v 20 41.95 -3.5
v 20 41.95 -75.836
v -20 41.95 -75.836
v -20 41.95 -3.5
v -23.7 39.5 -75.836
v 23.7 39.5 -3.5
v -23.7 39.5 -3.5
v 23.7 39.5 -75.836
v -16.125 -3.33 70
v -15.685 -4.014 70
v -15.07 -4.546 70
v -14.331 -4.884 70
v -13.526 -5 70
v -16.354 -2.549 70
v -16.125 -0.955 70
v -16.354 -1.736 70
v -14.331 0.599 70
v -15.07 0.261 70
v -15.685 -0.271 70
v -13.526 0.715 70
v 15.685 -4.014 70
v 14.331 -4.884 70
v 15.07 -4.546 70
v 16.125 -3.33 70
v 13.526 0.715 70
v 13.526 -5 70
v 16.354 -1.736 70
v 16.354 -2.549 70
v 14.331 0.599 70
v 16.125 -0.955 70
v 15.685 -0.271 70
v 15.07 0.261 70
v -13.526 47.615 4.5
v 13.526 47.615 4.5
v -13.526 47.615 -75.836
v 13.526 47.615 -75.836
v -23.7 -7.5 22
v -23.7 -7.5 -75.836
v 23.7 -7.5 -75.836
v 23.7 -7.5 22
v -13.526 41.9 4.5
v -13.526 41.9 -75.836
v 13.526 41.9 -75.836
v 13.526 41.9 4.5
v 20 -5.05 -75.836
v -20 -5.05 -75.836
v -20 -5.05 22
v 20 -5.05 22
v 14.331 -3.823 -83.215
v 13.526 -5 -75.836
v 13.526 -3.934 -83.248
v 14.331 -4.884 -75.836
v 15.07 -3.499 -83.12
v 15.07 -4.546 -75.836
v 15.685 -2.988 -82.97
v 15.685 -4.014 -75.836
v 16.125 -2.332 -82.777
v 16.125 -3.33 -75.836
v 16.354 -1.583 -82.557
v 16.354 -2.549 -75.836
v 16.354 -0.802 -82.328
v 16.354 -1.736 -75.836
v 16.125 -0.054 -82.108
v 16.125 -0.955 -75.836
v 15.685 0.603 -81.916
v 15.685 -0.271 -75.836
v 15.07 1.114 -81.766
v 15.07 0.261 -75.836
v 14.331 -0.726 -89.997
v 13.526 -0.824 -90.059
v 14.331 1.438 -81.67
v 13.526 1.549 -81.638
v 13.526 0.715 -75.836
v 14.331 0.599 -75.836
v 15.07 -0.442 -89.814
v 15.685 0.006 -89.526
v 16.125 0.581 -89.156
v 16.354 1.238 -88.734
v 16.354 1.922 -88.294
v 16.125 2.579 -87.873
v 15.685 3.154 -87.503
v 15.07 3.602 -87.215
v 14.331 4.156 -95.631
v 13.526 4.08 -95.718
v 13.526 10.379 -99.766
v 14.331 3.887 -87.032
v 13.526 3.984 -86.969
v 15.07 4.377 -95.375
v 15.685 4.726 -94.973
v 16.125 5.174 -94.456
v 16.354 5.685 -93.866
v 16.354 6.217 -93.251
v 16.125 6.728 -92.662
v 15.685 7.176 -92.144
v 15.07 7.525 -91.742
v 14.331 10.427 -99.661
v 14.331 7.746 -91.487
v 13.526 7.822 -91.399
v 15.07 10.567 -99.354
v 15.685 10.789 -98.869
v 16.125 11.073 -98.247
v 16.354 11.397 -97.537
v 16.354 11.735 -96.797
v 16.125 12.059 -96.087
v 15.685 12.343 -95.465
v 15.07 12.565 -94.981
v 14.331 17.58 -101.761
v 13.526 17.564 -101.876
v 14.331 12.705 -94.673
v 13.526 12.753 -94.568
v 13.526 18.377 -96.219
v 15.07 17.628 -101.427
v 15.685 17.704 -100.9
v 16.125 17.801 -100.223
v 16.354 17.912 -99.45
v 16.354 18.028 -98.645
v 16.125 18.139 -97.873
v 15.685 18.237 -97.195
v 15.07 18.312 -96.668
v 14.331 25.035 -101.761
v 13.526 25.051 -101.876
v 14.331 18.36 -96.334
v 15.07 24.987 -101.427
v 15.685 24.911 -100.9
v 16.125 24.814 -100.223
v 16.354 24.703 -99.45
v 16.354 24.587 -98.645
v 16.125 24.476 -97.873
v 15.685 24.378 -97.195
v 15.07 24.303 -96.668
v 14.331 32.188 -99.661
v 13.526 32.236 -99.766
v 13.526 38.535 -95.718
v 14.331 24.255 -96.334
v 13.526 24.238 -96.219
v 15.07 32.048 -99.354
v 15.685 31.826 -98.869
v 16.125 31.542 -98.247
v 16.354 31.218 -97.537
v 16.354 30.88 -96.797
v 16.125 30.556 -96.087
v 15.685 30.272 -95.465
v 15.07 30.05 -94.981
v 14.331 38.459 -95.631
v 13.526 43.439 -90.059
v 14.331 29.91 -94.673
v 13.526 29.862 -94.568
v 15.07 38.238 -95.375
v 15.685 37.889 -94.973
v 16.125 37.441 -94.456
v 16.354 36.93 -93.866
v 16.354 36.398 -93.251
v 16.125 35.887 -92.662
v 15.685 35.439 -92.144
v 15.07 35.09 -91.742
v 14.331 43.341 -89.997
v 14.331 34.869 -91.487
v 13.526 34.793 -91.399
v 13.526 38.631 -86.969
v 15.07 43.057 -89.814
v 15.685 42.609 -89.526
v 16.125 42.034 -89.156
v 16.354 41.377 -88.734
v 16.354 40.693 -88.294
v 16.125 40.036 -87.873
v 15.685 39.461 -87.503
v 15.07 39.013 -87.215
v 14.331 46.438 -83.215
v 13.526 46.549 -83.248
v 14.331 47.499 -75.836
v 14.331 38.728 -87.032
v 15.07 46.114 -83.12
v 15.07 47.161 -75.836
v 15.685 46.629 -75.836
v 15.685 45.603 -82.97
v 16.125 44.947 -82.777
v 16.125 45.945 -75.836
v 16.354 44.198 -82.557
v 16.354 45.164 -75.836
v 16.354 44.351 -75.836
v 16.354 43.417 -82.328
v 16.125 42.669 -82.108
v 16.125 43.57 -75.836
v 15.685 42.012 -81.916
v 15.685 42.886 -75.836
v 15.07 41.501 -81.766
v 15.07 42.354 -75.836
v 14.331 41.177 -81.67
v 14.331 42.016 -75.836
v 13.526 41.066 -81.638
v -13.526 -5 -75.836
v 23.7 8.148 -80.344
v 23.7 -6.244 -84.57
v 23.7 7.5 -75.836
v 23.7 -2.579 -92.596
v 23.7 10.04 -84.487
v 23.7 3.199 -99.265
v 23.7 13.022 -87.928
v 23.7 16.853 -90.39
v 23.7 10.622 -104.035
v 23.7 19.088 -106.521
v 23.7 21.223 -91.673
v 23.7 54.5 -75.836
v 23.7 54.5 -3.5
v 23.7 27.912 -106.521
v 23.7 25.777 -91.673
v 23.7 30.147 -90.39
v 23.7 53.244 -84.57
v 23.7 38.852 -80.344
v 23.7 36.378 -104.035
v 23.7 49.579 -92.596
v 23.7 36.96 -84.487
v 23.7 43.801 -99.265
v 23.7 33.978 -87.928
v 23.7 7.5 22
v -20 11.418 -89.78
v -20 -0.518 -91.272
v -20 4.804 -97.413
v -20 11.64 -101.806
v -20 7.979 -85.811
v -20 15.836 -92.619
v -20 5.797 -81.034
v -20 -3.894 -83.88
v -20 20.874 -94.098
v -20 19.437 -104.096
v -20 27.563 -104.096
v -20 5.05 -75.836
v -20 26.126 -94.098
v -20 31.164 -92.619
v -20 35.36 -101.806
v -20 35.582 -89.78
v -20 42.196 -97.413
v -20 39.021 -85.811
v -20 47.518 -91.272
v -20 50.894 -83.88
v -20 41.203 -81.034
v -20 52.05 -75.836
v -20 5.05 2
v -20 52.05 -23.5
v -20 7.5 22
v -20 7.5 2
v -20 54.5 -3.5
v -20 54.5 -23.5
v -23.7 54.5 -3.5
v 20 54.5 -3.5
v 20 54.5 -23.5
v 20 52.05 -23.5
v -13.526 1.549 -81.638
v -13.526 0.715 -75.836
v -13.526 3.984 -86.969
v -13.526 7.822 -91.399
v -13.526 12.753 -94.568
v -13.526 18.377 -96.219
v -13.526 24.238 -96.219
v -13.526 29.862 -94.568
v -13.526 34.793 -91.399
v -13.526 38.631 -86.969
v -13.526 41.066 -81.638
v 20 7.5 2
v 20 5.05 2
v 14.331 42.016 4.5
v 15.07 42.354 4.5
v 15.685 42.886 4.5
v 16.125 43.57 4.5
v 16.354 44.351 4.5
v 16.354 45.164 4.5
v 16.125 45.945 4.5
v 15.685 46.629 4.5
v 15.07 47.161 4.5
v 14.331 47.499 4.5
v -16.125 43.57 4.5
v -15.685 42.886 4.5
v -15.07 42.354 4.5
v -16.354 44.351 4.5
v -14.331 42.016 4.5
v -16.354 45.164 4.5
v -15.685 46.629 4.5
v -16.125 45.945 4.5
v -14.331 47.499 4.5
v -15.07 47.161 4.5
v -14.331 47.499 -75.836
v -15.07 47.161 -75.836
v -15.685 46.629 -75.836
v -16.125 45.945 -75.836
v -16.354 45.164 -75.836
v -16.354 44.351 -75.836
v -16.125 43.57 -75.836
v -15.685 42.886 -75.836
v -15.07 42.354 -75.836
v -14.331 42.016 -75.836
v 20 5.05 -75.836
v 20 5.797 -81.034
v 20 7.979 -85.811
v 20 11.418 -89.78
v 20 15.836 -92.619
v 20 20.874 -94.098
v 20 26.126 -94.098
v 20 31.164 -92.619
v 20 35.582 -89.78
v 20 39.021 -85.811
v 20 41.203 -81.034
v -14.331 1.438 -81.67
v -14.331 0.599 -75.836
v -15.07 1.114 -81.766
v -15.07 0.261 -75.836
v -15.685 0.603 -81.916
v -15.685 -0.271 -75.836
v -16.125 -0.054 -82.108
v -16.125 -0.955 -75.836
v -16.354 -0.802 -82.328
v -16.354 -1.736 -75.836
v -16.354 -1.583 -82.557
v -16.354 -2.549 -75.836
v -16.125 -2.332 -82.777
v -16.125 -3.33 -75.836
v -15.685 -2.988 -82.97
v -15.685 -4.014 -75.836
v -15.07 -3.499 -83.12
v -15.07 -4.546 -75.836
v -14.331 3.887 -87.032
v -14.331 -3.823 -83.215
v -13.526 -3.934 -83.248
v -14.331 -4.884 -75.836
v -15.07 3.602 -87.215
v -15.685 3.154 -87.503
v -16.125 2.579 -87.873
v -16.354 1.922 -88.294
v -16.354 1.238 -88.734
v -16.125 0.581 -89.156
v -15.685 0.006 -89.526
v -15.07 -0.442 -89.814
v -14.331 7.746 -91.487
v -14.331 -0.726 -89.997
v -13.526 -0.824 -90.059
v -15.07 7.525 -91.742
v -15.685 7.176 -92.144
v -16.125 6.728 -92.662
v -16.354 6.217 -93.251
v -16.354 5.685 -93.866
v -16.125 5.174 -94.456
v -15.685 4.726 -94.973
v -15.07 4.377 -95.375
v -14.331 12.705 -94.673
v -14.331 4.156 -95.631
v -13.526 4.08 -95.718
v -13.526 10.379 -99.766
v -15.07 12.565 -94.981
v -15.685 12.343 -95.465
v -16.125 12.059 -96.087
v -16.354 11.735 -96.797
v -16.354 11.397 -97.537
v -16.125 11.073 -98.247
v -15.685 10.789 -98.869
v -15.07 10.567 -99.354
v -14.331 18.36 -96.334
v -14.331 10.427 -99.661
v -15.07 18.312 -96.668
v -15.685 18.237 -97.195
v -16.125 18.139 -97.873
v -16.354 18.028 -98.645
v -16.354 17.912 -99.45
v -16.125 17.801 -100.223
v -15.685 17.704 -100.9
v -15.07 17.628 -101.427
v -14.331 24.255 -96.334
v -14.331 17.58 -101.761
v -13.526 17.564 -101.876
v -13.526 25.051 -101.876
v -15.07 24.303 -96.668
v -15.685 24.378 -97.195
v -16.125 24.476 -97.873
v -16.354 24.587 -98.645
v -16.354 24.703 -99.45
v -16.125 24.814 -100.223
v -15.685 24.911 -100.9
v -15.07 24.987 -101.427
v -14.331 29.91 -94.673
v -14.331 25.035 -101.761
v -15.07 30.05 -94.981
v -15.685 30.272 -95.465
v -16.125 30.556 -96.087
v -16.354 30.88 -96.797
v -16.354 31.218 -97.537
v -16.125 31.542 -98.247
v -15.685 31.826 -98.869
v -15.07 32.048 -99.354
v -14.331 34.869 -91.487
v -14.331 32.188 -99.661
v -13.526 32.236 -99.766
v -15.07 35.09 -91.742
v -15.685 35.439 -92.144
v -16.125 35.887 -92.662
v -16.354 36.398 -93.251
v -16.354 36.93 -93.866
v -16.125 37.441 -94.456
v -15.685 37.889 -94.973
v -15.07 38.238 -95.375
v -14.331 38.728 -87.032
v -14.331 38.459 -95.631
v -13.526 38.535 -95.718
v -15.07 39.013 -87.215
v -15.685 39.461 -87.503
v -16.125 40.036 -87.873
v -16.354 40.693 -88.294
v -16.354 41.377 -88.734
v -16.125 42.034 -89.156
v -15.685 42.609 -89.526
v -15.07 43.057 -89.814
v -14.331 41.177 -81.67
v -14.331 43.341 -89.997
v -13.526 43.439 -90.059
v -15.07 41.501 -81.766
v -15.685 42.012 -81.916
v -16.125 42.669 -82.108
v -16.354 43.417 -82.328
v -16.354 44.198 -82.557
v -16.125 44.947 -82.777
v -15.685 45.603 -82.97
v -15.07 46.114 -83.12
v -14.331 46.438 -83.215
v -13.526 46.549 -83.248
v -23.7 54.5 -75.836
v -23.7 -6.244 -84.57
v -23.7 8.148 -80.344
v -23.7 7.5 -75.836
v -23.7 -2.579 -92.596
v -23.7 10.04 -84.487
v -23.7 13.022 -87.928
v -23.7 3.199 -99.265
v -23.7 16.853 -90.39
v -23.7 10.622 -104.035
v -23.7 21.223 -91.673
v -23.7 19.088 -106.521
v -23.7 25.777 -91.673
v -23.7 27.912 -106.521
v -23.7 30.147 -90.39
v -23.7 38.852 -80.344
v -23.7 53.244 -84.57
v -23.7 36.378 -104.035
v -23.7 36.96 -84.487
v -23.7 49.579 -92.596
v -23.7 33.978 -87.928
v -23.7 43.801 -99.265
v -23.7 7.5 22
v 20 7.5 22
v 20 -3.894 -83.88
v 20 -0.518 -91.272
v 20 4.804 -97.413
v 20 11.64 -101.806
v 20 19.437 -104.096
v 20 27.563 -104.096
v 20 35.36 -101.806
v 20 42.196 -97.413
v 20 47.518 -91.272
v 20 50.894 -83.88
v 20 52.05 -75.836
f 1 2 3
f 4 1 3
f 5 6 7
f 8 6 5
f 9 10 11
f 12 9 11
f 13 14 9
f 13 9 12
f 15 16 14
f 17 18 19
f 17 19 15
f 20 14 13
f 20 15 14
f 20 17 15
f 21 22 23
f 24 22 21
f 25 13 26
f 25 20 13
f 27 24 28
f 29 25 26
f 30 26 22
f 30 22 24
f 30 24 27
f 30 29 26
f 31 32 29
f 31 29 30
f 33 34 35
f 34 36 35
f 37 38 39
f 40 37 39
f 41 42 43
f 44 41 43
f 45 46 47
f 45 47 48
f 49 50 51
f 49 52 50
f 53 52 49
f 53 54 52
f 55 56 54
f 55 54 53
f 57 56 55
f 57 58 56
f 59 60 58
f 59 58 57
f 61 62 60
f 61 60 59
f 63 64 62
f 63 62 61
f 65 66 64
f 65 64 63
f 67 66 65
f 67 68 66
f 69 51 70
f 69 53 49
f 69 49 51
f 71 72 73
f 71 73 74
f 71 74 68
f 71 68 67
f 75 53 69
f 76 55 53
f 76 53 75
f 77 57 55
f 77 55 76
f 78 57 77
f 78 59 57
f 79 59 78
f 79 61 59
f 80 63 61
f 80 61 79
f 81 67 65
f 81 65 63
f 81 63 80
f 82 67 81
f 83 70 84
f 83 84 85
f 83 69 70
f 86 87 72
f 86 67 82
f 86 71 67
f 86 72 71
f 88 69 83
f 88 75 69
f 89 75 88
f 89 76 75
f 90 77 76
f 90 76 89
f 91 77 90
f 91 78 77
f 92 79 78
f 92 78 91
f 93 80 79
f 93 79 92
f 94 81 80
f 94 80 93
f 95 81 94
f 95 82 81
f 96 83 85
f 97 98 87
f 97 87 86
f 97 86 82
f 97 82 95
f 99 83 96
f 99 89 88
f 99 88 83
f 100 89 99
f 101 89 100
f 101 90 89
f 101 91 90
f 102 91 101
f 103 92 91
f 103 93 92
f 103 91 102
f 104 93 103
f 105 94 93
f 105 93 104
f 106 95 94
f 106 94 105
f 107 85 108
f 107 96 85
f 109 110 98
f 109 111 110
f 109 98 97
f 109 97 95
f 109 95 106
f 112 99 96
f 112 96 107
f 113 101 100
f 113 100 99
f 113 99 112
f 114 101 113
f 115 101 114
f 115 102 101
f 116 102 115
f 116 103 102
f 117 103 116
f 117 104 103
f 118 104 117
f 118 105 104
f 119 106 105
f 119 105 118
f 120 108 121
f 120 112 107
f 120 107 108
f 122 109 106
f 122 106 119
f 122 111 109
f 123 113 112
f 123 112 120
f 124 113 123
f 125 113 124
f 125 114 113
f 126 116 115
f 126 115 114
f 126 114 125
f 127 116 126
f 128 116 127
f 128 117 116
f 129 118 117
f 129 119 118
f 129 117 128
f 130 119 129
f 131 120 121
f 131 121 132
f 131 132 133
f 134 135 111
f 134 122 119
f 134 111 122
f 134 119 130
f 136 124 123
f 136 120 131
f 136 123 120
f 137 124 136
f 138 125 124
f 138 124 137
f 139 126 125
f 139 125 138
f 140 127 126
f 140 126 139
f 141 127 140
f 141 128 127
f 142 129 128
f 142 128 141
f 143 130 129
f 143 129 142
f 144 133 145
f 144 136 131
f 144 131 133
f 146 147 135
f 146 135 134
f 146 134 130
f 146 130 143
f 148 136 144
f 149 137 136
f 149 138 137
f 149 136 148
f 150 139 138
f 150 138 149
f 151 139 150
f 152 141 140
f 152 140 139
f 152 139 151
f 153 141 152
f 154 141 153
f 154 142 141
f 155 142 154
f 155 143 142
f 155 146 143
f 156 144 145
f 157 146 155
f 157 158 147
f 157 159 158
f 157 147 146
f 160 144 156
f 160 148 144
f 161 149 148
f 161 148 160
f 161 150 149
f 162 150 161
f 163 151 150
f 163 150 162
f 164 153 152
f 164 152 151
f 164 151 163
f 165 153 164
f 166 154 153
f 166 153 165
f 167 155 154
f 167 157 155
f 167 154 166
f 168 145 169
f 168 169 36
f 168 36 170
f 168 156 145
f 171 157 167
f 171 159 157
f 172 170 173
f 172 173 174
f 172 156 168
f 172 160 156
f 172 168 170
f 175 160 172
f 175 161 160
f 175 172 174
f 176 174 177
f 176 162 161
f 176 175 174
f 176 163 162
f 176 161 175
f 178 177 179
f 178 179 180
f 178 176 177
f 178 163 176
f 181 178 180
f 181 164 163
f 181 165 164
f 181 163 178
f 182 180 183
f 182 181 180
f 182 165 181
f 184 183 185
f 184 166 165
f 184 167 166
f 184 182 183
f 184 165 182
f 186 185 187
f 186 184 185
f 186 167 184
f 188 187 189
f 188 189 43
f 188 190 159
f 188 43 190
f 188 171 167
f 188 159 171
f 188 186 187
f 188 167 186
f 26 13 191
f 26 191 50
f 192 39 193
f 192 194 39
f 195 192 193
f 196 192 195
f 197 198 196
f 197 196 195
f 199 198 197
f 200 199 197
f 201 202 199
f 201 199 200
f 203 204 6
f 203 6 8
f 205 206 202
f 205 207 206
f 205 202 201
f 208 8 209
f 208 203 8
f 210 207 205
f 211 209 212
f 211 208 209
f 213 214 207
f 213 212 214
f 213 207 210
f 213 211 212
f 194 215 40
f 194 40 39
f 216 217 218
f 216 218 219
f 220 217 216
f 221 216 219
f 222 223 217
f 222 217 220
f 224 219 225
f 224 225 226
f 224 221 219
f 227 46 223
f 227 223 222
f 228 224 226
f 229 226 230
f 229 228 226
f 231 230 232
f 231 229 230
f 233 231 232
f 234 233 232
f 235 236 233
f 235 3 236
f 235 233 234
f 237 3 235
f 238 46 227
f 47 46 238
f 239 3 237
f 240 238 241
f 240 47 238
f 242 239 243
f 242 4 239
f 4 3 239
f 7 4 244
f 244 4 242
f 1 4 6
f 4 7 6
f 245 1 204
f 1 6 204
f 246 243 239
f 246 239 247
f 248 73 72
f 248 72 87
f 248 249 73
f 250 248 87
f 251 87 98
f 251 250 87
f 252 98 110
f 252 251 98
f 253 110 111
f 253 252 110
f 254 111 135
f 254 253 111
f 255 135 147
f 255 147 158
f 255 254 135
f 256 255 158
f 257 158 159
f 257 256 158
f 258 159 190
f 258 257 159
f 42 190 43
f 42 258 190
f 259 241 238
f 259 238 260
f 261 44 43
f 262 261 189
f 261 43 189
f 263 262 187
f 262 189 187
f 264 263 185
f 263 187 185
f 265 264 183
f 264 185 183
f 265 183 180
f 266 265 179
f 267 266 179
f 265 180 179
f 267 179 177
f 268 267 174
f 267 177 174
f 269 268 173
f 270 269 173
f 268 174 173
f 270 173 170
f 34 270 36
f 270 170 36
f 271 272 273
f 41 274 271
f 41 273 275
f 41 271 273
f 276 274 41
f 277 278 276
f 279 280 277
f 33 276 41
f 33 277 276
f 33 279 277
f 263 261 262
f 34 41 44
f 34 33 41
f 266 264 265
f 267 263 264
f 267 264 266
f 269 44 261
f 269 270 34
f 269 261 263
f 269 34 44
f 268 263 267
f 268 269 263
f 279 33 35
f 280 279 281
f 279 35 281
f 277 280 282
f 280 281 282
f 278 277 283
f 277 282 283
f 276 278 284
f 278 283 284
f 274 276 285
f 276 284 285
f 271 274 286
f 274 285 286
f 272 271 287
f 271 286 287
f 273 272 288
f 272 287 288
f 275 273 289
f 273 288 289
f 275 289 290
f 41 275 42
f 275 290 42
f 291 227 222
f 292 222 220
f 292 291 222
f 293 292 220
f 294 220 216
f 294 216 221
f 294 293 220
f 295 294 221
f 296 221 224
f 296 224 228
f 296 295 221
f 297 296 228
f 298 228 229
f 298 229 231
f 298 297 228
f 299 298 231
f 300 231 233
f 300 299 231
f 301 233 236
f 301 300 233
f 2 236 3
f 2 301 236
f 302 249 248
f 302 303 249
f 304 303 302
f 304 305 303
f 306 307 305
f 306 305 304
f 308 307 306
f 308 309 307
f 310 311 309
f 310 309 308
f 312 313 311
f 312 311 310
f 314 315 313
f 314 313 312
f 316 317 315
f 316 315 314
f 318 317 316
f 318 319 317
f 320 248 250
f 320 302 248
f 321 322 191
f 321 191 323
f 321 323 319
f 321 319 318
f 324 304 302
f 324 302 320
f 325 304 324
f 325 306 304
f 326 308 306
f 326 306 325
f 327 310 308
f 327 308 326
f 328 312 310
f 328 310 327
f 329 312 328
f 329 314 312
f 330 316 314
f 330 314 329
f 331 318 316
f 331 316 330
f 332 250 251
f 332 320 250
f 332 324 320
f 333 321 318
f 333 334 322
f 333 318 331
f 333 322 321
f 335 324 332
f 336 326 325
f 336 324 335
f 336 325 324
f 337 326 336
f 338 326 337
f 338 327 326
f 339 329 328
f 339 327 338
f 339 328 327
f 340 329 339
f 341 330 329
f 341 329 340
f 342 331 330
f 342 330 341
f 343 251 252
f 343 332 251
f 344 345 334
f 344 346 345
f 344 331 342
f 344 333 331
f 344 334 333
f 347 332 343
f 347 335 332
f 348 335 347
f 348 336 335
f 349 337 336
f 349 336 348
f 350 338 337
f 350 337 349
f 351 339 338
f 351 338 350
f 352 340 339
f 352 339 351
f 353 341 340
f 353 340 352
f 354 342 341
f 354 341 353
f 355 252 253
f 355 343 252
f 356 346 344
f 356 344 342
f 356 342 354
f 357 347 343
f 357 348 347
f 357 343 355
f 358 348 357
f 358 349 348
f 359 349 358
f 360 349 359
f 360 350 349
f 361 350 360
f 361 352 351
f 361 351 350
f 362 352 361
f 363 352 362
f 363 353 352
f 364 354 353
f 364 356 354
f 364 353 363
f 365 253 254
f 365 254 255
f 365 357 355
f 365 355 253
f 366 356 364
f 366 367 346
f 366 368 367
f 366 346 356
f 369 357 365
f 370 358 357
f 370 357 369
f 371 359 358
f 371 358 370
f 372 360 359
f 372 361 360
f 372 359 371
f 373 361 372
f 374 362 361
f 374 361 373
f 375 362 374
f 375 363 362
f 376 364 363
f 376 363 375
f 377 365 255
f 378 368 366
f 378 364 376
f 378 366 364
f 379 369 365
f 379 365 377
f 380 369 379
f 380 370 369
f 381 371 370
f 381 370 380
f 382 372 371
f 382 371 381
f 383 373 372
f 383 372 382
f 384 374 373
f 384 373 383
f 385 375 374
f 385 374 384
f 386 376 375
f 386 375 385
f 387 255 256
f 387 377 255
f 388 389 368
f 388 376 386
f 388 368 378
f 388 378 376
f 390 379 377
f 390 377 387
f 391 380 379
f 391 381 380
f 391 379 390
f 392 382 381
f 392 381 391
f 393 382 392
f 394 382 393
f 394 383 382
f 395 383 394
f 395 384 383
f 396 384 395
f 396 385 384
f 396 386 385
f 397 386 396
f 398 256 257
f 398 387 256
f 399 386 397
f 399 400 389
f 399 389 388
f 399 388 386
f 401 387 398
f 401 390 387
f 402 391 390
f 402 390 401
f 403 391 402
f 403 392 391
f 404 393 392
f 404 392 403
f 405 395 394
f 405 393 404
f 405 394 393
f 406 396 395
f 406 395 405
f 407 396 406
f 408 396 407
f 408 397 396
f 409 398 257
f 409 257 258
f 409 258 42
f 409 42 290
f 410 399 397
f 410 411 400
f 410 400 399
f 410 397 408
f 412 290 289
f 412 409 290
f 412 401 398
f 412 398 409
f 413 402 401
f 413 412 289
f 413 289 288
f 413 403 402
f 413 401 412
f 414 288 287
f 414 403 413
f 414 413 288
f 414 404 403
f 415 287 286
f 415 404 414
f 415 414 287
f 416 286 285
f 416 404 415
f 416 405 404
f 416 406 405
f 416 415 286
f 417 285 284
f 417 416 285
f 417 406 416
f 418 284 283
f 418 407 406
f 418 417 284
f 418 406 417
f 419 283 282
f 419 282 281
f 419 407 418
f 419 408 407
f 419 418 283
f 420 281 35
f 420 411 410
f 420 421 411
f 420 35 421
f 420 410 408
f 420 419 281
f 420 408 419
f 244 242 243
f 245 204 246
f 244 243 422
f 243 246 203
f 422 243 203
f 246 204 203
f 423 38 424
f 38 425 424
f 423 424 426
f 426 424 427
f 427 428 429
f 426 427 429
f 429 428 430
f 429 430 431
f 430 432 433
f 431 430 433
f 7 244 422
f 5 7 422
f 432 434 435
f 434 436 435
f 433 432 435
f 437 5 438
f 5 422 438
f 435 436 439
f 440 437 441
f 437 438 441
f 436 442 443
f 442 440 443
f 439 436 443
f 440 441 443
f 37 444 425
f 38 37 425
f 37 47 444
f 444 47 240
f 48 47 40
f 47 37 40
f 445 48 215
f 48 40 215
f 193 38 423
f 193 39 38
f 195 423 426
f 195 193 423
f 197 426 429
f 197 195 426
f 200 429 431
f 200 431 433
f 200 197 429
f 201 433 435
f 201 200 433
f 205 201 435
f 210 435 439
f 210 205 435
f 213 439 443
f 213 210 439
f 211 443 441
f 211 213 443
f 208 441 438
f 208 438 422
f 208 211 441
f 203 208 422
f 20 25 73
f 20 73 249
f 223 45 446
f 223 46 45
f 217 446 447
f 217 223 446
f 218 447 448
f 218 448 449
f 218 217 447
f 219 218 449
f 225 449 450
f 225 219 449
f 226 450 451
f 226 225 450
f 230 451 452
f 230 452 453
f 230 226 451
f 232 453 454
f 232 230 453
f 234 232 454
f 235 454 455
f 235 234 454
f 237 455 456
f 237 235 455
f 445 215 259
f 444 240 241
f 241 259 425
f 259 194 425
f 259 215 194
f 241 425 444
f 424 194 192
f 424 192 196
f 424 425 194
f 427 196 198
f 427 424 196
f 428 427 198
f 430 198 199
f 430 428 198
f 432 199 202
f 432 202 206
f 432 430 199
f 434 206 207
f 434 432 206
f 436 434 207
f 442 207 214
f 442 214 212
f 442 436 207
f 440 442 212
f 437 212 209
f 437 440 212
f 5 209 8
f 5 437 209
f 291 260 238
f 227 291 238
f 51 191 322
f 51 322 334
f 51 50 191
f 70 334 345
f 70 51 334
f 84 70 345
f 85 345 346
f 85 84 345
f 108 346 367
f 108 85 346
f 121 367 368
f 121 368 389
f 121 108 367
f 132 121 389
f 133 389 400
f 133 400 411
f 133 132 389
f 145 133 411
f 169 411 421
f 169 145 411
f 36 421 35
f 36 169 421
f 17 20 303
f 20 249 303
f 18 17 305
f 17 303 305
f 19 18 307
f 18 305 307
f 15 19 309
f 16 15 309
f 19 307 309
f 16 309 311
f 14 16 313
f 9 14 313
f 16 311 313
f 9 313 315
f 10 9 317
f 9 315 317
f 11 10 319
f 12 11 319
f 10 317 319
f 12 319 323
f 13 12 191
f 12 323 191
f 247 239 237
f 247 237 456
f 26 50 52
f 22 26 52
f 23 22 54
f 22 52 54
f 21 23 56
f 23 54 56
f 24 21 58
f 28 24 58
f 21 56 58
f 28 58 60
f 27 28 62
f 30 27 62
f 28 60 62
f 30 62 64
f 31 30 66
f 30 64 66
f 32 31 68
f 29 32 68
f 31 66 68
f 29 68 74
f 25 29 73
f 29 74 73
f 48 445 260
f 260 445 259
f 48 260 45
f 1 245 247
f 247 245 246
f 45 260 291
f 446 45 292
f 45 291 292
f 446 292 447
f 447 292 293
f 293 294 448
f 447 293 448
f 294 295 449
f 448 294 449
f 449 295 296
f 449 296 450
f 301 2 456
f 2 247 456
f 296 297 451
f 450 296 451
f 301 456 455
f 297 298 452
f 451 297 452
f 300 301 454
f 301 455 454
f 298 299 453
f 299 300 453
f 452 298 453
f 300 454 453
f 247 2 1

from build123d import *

# Parameters (mm, degrees)
SKETCH2_W          = 47.4
SKETCH2_H          = 15
SKETCH2_W_2        = 40
SKETCH2_H_2        = 10.1
SKETCH26_W         = 22
SKETCH26_H         = 15
EXTRUDE7_DEPTH     = 47.4
SKETCH29_W         = 40
SKETCH29_H         = 10.1
CUT_EXTRUDE1_REACH = 127.776
SKETCH35_W         = 40
SKETCH35_H         = 20
CUT_EXTRUDE2_REACH = 121.099
SKETCH36_W         = 40
SKETCH36_H         = 20
EXTRUDE4_DEPTH     = 70
EXTRUDE8_DEPTH     = 30


with BuildPart() as part:
    # Sweep1: sweep along a path in Sketch15
    with BuildLine(Plane(origin=(0, 0, 0), x_dir=(0, 0, -1), z_dir=(1, 0, 0))) as sweep1_path:
        Line((0, 0), (75.83628632, 0))
        ThreePointArc((75.83628632, 0), (99.33628632, 23.5), (75.83628632, 47))
        Line((75.83628632, 47), (25.5, 47))
    # Sketch2 → Sweep1 (sweep)
    with BuildSketch(Plane.XY):
        Rectangle(SKETCH2_W, SKETCH2_H)
        Rectangle(SKETCH2_W_2, SKETCH2_H_2, mode=Mode.SUBTRACT)
    sweep(path=sweep1_path.line)

    # Sketch26 → Extrude7 (add)
    with BuildSketch(Plane(origin=(23.7, 0, 0), x_dir=(0, 0, -1), z_dir=(1, 0, 0))):
        with Locations((14.5, 47)):
            Rectangle(SKETCH26_W, SKETCH26_H)
        with Locations((-11, 0)):
            Rectangle(SKETCH26_W, SKETCH26_H)
    extrude(amount=-EXTRUDE7_DEPTH)

    # Cut-Sweep2: sweep along a path in Sketch30
    with BuildLine(Plane(origin=(0, 0, 0), x_dir=(0, 0, -1), z_dir=(1, 0, 0))) as cut_sweep2_path:
        Line((-22, 0), (75.83628632, 0))
        ThreePointArc((75.83628632, 0), (99.33628632, 23.5), (75.83628632, 47))
        Line((75.83628632, 47), (3.5, 47))
    # Sketch29 → Cut-Sweep2 (sweep, cut)
    with BuildSketch(Plane.XY.offset(22)):
        Rectangle(SKETCH29_W, SKETCH29_H)
    sweep(path=cut_sweep2_path.line, mode=Mode.SUBTRACT)

    # Sketch35 → Cut-Extrude1 (cut, up to next)
    with BuildSketch(Plane(origin=(0, 54.5, 0), x_dir=(1, 0, 0), z_dir=(0, 1, 0)), mode=Mode.PRIVATE) as cut_extrude1_sk1:
        with Locations((0, 13.5)):
            Rectangle(SKETCH35_W, SKETCH35_H)
    cut_extrude1_tool1 = extrude(cut_extrude1_sk1.sketch, amount=-CUT_EXTRUDE1_REACH, mode=Mode.PRIVATE) & part.part
    add(cut_extrude1_tool1.solids().sort_by_distance((0, 54.5, -13.5))[0], mode=Mode.SUBTRACT)

    # Sketch36 → Cut-Extrude2 (cut, up to next)
    with BuildSketch(Plane(origin=(0, 7.5, 0), x_dir=(1, 0, 0), z_dir=(0, 1, 0)), mode=Mode.PRIVATE) as cut_extrude2_sk1:
        with Locations((0, -12)):
            Rectangle(SKETCH36_W, SKETCH36_H)
    cut_extrude2_tool1 = extrude(cut_extrude2_sk1.sketch, amount=-CUT_EXTRUDE2_REACH, mode=Mode.PRIVATE) & part.part
    add(cut_extrude2_tool1.solids().sort_by_distance((0, 7.5, 12))[0], mode=Mode.SUBTRACT)


with BuildPart() as body_2:
    # Sweep2: sweep along a path in Sketch34
    with BuildLine(Plane(origin=(0, 0, 0), x_dir=(0, 0, -1), z_dir=(1, 0, 0))) as sweep2_path:
        Line((0, -2.1925), (75.83628632, -2.1925))
        ThreePointArc((75.83628632, -2.1925), (99.33628632, 21.3075), (75.83628632, 44.8075))
        Line((75.83628632, 44.8075), (25.5, 44.8075))
    # Sketch1 → Sweep2 (sweep)
    with BuildSketch(Plane.XY):
        with BuildLine():
            Line((-13.5255, 0.715), (13.5255, 0.715))
            ThreePointArc((13.5255, 0.715), (16.383, -2.1425), (13.5255, -5))
            Line((13.5255, -5), (-13.5255, -5))
            ThreePointArc((-13.5255, -5), (-16.383, -2.1425), (-13.5255, 0.715))
        make_face()
    sweep(path=sweep2_path.line)

    # Sketch25 → Extrude4 (add)
    with BuildSketch(Plane.XY):
        with BuildLine():
            Line((13.5255, 0.715), (-13.5255, 0.715))
            ThreePointArc((-13.5255, 0.715), (-16.383, -2.1425), (-13.5255, -5))
            Line((-13.5255, -5), (13.5255, -5))
            ThreePointArc((13.5255, -5), (16.383, -2.1425), (13.5255, 0.715))
        make_face()
    extrude(amount=EXTRUDE4_DEPTH)

    # Sketch31 → Extrude8 (add)
    with BuildSketch(Plane.XY.offset(-25.5)):
        with BuildLine():
            Line((-13.5255, 41.9), (13.5255, 41.9))
            ThreePointArc((13.5255, 41.9), (16.383, 44.7575), (13.5255, 47.615))
            Line((13.5255, 47.615), (-13.5255, 47.615))
            ThreePointArc((-13.5255, 47.615), (-16.383, 44.7575), (-13.5255, 41.9))
        make_face()
    extrude(amount=EXTRUDE8_DEPTH)


solid = Compound([part.part, body_2.part])
